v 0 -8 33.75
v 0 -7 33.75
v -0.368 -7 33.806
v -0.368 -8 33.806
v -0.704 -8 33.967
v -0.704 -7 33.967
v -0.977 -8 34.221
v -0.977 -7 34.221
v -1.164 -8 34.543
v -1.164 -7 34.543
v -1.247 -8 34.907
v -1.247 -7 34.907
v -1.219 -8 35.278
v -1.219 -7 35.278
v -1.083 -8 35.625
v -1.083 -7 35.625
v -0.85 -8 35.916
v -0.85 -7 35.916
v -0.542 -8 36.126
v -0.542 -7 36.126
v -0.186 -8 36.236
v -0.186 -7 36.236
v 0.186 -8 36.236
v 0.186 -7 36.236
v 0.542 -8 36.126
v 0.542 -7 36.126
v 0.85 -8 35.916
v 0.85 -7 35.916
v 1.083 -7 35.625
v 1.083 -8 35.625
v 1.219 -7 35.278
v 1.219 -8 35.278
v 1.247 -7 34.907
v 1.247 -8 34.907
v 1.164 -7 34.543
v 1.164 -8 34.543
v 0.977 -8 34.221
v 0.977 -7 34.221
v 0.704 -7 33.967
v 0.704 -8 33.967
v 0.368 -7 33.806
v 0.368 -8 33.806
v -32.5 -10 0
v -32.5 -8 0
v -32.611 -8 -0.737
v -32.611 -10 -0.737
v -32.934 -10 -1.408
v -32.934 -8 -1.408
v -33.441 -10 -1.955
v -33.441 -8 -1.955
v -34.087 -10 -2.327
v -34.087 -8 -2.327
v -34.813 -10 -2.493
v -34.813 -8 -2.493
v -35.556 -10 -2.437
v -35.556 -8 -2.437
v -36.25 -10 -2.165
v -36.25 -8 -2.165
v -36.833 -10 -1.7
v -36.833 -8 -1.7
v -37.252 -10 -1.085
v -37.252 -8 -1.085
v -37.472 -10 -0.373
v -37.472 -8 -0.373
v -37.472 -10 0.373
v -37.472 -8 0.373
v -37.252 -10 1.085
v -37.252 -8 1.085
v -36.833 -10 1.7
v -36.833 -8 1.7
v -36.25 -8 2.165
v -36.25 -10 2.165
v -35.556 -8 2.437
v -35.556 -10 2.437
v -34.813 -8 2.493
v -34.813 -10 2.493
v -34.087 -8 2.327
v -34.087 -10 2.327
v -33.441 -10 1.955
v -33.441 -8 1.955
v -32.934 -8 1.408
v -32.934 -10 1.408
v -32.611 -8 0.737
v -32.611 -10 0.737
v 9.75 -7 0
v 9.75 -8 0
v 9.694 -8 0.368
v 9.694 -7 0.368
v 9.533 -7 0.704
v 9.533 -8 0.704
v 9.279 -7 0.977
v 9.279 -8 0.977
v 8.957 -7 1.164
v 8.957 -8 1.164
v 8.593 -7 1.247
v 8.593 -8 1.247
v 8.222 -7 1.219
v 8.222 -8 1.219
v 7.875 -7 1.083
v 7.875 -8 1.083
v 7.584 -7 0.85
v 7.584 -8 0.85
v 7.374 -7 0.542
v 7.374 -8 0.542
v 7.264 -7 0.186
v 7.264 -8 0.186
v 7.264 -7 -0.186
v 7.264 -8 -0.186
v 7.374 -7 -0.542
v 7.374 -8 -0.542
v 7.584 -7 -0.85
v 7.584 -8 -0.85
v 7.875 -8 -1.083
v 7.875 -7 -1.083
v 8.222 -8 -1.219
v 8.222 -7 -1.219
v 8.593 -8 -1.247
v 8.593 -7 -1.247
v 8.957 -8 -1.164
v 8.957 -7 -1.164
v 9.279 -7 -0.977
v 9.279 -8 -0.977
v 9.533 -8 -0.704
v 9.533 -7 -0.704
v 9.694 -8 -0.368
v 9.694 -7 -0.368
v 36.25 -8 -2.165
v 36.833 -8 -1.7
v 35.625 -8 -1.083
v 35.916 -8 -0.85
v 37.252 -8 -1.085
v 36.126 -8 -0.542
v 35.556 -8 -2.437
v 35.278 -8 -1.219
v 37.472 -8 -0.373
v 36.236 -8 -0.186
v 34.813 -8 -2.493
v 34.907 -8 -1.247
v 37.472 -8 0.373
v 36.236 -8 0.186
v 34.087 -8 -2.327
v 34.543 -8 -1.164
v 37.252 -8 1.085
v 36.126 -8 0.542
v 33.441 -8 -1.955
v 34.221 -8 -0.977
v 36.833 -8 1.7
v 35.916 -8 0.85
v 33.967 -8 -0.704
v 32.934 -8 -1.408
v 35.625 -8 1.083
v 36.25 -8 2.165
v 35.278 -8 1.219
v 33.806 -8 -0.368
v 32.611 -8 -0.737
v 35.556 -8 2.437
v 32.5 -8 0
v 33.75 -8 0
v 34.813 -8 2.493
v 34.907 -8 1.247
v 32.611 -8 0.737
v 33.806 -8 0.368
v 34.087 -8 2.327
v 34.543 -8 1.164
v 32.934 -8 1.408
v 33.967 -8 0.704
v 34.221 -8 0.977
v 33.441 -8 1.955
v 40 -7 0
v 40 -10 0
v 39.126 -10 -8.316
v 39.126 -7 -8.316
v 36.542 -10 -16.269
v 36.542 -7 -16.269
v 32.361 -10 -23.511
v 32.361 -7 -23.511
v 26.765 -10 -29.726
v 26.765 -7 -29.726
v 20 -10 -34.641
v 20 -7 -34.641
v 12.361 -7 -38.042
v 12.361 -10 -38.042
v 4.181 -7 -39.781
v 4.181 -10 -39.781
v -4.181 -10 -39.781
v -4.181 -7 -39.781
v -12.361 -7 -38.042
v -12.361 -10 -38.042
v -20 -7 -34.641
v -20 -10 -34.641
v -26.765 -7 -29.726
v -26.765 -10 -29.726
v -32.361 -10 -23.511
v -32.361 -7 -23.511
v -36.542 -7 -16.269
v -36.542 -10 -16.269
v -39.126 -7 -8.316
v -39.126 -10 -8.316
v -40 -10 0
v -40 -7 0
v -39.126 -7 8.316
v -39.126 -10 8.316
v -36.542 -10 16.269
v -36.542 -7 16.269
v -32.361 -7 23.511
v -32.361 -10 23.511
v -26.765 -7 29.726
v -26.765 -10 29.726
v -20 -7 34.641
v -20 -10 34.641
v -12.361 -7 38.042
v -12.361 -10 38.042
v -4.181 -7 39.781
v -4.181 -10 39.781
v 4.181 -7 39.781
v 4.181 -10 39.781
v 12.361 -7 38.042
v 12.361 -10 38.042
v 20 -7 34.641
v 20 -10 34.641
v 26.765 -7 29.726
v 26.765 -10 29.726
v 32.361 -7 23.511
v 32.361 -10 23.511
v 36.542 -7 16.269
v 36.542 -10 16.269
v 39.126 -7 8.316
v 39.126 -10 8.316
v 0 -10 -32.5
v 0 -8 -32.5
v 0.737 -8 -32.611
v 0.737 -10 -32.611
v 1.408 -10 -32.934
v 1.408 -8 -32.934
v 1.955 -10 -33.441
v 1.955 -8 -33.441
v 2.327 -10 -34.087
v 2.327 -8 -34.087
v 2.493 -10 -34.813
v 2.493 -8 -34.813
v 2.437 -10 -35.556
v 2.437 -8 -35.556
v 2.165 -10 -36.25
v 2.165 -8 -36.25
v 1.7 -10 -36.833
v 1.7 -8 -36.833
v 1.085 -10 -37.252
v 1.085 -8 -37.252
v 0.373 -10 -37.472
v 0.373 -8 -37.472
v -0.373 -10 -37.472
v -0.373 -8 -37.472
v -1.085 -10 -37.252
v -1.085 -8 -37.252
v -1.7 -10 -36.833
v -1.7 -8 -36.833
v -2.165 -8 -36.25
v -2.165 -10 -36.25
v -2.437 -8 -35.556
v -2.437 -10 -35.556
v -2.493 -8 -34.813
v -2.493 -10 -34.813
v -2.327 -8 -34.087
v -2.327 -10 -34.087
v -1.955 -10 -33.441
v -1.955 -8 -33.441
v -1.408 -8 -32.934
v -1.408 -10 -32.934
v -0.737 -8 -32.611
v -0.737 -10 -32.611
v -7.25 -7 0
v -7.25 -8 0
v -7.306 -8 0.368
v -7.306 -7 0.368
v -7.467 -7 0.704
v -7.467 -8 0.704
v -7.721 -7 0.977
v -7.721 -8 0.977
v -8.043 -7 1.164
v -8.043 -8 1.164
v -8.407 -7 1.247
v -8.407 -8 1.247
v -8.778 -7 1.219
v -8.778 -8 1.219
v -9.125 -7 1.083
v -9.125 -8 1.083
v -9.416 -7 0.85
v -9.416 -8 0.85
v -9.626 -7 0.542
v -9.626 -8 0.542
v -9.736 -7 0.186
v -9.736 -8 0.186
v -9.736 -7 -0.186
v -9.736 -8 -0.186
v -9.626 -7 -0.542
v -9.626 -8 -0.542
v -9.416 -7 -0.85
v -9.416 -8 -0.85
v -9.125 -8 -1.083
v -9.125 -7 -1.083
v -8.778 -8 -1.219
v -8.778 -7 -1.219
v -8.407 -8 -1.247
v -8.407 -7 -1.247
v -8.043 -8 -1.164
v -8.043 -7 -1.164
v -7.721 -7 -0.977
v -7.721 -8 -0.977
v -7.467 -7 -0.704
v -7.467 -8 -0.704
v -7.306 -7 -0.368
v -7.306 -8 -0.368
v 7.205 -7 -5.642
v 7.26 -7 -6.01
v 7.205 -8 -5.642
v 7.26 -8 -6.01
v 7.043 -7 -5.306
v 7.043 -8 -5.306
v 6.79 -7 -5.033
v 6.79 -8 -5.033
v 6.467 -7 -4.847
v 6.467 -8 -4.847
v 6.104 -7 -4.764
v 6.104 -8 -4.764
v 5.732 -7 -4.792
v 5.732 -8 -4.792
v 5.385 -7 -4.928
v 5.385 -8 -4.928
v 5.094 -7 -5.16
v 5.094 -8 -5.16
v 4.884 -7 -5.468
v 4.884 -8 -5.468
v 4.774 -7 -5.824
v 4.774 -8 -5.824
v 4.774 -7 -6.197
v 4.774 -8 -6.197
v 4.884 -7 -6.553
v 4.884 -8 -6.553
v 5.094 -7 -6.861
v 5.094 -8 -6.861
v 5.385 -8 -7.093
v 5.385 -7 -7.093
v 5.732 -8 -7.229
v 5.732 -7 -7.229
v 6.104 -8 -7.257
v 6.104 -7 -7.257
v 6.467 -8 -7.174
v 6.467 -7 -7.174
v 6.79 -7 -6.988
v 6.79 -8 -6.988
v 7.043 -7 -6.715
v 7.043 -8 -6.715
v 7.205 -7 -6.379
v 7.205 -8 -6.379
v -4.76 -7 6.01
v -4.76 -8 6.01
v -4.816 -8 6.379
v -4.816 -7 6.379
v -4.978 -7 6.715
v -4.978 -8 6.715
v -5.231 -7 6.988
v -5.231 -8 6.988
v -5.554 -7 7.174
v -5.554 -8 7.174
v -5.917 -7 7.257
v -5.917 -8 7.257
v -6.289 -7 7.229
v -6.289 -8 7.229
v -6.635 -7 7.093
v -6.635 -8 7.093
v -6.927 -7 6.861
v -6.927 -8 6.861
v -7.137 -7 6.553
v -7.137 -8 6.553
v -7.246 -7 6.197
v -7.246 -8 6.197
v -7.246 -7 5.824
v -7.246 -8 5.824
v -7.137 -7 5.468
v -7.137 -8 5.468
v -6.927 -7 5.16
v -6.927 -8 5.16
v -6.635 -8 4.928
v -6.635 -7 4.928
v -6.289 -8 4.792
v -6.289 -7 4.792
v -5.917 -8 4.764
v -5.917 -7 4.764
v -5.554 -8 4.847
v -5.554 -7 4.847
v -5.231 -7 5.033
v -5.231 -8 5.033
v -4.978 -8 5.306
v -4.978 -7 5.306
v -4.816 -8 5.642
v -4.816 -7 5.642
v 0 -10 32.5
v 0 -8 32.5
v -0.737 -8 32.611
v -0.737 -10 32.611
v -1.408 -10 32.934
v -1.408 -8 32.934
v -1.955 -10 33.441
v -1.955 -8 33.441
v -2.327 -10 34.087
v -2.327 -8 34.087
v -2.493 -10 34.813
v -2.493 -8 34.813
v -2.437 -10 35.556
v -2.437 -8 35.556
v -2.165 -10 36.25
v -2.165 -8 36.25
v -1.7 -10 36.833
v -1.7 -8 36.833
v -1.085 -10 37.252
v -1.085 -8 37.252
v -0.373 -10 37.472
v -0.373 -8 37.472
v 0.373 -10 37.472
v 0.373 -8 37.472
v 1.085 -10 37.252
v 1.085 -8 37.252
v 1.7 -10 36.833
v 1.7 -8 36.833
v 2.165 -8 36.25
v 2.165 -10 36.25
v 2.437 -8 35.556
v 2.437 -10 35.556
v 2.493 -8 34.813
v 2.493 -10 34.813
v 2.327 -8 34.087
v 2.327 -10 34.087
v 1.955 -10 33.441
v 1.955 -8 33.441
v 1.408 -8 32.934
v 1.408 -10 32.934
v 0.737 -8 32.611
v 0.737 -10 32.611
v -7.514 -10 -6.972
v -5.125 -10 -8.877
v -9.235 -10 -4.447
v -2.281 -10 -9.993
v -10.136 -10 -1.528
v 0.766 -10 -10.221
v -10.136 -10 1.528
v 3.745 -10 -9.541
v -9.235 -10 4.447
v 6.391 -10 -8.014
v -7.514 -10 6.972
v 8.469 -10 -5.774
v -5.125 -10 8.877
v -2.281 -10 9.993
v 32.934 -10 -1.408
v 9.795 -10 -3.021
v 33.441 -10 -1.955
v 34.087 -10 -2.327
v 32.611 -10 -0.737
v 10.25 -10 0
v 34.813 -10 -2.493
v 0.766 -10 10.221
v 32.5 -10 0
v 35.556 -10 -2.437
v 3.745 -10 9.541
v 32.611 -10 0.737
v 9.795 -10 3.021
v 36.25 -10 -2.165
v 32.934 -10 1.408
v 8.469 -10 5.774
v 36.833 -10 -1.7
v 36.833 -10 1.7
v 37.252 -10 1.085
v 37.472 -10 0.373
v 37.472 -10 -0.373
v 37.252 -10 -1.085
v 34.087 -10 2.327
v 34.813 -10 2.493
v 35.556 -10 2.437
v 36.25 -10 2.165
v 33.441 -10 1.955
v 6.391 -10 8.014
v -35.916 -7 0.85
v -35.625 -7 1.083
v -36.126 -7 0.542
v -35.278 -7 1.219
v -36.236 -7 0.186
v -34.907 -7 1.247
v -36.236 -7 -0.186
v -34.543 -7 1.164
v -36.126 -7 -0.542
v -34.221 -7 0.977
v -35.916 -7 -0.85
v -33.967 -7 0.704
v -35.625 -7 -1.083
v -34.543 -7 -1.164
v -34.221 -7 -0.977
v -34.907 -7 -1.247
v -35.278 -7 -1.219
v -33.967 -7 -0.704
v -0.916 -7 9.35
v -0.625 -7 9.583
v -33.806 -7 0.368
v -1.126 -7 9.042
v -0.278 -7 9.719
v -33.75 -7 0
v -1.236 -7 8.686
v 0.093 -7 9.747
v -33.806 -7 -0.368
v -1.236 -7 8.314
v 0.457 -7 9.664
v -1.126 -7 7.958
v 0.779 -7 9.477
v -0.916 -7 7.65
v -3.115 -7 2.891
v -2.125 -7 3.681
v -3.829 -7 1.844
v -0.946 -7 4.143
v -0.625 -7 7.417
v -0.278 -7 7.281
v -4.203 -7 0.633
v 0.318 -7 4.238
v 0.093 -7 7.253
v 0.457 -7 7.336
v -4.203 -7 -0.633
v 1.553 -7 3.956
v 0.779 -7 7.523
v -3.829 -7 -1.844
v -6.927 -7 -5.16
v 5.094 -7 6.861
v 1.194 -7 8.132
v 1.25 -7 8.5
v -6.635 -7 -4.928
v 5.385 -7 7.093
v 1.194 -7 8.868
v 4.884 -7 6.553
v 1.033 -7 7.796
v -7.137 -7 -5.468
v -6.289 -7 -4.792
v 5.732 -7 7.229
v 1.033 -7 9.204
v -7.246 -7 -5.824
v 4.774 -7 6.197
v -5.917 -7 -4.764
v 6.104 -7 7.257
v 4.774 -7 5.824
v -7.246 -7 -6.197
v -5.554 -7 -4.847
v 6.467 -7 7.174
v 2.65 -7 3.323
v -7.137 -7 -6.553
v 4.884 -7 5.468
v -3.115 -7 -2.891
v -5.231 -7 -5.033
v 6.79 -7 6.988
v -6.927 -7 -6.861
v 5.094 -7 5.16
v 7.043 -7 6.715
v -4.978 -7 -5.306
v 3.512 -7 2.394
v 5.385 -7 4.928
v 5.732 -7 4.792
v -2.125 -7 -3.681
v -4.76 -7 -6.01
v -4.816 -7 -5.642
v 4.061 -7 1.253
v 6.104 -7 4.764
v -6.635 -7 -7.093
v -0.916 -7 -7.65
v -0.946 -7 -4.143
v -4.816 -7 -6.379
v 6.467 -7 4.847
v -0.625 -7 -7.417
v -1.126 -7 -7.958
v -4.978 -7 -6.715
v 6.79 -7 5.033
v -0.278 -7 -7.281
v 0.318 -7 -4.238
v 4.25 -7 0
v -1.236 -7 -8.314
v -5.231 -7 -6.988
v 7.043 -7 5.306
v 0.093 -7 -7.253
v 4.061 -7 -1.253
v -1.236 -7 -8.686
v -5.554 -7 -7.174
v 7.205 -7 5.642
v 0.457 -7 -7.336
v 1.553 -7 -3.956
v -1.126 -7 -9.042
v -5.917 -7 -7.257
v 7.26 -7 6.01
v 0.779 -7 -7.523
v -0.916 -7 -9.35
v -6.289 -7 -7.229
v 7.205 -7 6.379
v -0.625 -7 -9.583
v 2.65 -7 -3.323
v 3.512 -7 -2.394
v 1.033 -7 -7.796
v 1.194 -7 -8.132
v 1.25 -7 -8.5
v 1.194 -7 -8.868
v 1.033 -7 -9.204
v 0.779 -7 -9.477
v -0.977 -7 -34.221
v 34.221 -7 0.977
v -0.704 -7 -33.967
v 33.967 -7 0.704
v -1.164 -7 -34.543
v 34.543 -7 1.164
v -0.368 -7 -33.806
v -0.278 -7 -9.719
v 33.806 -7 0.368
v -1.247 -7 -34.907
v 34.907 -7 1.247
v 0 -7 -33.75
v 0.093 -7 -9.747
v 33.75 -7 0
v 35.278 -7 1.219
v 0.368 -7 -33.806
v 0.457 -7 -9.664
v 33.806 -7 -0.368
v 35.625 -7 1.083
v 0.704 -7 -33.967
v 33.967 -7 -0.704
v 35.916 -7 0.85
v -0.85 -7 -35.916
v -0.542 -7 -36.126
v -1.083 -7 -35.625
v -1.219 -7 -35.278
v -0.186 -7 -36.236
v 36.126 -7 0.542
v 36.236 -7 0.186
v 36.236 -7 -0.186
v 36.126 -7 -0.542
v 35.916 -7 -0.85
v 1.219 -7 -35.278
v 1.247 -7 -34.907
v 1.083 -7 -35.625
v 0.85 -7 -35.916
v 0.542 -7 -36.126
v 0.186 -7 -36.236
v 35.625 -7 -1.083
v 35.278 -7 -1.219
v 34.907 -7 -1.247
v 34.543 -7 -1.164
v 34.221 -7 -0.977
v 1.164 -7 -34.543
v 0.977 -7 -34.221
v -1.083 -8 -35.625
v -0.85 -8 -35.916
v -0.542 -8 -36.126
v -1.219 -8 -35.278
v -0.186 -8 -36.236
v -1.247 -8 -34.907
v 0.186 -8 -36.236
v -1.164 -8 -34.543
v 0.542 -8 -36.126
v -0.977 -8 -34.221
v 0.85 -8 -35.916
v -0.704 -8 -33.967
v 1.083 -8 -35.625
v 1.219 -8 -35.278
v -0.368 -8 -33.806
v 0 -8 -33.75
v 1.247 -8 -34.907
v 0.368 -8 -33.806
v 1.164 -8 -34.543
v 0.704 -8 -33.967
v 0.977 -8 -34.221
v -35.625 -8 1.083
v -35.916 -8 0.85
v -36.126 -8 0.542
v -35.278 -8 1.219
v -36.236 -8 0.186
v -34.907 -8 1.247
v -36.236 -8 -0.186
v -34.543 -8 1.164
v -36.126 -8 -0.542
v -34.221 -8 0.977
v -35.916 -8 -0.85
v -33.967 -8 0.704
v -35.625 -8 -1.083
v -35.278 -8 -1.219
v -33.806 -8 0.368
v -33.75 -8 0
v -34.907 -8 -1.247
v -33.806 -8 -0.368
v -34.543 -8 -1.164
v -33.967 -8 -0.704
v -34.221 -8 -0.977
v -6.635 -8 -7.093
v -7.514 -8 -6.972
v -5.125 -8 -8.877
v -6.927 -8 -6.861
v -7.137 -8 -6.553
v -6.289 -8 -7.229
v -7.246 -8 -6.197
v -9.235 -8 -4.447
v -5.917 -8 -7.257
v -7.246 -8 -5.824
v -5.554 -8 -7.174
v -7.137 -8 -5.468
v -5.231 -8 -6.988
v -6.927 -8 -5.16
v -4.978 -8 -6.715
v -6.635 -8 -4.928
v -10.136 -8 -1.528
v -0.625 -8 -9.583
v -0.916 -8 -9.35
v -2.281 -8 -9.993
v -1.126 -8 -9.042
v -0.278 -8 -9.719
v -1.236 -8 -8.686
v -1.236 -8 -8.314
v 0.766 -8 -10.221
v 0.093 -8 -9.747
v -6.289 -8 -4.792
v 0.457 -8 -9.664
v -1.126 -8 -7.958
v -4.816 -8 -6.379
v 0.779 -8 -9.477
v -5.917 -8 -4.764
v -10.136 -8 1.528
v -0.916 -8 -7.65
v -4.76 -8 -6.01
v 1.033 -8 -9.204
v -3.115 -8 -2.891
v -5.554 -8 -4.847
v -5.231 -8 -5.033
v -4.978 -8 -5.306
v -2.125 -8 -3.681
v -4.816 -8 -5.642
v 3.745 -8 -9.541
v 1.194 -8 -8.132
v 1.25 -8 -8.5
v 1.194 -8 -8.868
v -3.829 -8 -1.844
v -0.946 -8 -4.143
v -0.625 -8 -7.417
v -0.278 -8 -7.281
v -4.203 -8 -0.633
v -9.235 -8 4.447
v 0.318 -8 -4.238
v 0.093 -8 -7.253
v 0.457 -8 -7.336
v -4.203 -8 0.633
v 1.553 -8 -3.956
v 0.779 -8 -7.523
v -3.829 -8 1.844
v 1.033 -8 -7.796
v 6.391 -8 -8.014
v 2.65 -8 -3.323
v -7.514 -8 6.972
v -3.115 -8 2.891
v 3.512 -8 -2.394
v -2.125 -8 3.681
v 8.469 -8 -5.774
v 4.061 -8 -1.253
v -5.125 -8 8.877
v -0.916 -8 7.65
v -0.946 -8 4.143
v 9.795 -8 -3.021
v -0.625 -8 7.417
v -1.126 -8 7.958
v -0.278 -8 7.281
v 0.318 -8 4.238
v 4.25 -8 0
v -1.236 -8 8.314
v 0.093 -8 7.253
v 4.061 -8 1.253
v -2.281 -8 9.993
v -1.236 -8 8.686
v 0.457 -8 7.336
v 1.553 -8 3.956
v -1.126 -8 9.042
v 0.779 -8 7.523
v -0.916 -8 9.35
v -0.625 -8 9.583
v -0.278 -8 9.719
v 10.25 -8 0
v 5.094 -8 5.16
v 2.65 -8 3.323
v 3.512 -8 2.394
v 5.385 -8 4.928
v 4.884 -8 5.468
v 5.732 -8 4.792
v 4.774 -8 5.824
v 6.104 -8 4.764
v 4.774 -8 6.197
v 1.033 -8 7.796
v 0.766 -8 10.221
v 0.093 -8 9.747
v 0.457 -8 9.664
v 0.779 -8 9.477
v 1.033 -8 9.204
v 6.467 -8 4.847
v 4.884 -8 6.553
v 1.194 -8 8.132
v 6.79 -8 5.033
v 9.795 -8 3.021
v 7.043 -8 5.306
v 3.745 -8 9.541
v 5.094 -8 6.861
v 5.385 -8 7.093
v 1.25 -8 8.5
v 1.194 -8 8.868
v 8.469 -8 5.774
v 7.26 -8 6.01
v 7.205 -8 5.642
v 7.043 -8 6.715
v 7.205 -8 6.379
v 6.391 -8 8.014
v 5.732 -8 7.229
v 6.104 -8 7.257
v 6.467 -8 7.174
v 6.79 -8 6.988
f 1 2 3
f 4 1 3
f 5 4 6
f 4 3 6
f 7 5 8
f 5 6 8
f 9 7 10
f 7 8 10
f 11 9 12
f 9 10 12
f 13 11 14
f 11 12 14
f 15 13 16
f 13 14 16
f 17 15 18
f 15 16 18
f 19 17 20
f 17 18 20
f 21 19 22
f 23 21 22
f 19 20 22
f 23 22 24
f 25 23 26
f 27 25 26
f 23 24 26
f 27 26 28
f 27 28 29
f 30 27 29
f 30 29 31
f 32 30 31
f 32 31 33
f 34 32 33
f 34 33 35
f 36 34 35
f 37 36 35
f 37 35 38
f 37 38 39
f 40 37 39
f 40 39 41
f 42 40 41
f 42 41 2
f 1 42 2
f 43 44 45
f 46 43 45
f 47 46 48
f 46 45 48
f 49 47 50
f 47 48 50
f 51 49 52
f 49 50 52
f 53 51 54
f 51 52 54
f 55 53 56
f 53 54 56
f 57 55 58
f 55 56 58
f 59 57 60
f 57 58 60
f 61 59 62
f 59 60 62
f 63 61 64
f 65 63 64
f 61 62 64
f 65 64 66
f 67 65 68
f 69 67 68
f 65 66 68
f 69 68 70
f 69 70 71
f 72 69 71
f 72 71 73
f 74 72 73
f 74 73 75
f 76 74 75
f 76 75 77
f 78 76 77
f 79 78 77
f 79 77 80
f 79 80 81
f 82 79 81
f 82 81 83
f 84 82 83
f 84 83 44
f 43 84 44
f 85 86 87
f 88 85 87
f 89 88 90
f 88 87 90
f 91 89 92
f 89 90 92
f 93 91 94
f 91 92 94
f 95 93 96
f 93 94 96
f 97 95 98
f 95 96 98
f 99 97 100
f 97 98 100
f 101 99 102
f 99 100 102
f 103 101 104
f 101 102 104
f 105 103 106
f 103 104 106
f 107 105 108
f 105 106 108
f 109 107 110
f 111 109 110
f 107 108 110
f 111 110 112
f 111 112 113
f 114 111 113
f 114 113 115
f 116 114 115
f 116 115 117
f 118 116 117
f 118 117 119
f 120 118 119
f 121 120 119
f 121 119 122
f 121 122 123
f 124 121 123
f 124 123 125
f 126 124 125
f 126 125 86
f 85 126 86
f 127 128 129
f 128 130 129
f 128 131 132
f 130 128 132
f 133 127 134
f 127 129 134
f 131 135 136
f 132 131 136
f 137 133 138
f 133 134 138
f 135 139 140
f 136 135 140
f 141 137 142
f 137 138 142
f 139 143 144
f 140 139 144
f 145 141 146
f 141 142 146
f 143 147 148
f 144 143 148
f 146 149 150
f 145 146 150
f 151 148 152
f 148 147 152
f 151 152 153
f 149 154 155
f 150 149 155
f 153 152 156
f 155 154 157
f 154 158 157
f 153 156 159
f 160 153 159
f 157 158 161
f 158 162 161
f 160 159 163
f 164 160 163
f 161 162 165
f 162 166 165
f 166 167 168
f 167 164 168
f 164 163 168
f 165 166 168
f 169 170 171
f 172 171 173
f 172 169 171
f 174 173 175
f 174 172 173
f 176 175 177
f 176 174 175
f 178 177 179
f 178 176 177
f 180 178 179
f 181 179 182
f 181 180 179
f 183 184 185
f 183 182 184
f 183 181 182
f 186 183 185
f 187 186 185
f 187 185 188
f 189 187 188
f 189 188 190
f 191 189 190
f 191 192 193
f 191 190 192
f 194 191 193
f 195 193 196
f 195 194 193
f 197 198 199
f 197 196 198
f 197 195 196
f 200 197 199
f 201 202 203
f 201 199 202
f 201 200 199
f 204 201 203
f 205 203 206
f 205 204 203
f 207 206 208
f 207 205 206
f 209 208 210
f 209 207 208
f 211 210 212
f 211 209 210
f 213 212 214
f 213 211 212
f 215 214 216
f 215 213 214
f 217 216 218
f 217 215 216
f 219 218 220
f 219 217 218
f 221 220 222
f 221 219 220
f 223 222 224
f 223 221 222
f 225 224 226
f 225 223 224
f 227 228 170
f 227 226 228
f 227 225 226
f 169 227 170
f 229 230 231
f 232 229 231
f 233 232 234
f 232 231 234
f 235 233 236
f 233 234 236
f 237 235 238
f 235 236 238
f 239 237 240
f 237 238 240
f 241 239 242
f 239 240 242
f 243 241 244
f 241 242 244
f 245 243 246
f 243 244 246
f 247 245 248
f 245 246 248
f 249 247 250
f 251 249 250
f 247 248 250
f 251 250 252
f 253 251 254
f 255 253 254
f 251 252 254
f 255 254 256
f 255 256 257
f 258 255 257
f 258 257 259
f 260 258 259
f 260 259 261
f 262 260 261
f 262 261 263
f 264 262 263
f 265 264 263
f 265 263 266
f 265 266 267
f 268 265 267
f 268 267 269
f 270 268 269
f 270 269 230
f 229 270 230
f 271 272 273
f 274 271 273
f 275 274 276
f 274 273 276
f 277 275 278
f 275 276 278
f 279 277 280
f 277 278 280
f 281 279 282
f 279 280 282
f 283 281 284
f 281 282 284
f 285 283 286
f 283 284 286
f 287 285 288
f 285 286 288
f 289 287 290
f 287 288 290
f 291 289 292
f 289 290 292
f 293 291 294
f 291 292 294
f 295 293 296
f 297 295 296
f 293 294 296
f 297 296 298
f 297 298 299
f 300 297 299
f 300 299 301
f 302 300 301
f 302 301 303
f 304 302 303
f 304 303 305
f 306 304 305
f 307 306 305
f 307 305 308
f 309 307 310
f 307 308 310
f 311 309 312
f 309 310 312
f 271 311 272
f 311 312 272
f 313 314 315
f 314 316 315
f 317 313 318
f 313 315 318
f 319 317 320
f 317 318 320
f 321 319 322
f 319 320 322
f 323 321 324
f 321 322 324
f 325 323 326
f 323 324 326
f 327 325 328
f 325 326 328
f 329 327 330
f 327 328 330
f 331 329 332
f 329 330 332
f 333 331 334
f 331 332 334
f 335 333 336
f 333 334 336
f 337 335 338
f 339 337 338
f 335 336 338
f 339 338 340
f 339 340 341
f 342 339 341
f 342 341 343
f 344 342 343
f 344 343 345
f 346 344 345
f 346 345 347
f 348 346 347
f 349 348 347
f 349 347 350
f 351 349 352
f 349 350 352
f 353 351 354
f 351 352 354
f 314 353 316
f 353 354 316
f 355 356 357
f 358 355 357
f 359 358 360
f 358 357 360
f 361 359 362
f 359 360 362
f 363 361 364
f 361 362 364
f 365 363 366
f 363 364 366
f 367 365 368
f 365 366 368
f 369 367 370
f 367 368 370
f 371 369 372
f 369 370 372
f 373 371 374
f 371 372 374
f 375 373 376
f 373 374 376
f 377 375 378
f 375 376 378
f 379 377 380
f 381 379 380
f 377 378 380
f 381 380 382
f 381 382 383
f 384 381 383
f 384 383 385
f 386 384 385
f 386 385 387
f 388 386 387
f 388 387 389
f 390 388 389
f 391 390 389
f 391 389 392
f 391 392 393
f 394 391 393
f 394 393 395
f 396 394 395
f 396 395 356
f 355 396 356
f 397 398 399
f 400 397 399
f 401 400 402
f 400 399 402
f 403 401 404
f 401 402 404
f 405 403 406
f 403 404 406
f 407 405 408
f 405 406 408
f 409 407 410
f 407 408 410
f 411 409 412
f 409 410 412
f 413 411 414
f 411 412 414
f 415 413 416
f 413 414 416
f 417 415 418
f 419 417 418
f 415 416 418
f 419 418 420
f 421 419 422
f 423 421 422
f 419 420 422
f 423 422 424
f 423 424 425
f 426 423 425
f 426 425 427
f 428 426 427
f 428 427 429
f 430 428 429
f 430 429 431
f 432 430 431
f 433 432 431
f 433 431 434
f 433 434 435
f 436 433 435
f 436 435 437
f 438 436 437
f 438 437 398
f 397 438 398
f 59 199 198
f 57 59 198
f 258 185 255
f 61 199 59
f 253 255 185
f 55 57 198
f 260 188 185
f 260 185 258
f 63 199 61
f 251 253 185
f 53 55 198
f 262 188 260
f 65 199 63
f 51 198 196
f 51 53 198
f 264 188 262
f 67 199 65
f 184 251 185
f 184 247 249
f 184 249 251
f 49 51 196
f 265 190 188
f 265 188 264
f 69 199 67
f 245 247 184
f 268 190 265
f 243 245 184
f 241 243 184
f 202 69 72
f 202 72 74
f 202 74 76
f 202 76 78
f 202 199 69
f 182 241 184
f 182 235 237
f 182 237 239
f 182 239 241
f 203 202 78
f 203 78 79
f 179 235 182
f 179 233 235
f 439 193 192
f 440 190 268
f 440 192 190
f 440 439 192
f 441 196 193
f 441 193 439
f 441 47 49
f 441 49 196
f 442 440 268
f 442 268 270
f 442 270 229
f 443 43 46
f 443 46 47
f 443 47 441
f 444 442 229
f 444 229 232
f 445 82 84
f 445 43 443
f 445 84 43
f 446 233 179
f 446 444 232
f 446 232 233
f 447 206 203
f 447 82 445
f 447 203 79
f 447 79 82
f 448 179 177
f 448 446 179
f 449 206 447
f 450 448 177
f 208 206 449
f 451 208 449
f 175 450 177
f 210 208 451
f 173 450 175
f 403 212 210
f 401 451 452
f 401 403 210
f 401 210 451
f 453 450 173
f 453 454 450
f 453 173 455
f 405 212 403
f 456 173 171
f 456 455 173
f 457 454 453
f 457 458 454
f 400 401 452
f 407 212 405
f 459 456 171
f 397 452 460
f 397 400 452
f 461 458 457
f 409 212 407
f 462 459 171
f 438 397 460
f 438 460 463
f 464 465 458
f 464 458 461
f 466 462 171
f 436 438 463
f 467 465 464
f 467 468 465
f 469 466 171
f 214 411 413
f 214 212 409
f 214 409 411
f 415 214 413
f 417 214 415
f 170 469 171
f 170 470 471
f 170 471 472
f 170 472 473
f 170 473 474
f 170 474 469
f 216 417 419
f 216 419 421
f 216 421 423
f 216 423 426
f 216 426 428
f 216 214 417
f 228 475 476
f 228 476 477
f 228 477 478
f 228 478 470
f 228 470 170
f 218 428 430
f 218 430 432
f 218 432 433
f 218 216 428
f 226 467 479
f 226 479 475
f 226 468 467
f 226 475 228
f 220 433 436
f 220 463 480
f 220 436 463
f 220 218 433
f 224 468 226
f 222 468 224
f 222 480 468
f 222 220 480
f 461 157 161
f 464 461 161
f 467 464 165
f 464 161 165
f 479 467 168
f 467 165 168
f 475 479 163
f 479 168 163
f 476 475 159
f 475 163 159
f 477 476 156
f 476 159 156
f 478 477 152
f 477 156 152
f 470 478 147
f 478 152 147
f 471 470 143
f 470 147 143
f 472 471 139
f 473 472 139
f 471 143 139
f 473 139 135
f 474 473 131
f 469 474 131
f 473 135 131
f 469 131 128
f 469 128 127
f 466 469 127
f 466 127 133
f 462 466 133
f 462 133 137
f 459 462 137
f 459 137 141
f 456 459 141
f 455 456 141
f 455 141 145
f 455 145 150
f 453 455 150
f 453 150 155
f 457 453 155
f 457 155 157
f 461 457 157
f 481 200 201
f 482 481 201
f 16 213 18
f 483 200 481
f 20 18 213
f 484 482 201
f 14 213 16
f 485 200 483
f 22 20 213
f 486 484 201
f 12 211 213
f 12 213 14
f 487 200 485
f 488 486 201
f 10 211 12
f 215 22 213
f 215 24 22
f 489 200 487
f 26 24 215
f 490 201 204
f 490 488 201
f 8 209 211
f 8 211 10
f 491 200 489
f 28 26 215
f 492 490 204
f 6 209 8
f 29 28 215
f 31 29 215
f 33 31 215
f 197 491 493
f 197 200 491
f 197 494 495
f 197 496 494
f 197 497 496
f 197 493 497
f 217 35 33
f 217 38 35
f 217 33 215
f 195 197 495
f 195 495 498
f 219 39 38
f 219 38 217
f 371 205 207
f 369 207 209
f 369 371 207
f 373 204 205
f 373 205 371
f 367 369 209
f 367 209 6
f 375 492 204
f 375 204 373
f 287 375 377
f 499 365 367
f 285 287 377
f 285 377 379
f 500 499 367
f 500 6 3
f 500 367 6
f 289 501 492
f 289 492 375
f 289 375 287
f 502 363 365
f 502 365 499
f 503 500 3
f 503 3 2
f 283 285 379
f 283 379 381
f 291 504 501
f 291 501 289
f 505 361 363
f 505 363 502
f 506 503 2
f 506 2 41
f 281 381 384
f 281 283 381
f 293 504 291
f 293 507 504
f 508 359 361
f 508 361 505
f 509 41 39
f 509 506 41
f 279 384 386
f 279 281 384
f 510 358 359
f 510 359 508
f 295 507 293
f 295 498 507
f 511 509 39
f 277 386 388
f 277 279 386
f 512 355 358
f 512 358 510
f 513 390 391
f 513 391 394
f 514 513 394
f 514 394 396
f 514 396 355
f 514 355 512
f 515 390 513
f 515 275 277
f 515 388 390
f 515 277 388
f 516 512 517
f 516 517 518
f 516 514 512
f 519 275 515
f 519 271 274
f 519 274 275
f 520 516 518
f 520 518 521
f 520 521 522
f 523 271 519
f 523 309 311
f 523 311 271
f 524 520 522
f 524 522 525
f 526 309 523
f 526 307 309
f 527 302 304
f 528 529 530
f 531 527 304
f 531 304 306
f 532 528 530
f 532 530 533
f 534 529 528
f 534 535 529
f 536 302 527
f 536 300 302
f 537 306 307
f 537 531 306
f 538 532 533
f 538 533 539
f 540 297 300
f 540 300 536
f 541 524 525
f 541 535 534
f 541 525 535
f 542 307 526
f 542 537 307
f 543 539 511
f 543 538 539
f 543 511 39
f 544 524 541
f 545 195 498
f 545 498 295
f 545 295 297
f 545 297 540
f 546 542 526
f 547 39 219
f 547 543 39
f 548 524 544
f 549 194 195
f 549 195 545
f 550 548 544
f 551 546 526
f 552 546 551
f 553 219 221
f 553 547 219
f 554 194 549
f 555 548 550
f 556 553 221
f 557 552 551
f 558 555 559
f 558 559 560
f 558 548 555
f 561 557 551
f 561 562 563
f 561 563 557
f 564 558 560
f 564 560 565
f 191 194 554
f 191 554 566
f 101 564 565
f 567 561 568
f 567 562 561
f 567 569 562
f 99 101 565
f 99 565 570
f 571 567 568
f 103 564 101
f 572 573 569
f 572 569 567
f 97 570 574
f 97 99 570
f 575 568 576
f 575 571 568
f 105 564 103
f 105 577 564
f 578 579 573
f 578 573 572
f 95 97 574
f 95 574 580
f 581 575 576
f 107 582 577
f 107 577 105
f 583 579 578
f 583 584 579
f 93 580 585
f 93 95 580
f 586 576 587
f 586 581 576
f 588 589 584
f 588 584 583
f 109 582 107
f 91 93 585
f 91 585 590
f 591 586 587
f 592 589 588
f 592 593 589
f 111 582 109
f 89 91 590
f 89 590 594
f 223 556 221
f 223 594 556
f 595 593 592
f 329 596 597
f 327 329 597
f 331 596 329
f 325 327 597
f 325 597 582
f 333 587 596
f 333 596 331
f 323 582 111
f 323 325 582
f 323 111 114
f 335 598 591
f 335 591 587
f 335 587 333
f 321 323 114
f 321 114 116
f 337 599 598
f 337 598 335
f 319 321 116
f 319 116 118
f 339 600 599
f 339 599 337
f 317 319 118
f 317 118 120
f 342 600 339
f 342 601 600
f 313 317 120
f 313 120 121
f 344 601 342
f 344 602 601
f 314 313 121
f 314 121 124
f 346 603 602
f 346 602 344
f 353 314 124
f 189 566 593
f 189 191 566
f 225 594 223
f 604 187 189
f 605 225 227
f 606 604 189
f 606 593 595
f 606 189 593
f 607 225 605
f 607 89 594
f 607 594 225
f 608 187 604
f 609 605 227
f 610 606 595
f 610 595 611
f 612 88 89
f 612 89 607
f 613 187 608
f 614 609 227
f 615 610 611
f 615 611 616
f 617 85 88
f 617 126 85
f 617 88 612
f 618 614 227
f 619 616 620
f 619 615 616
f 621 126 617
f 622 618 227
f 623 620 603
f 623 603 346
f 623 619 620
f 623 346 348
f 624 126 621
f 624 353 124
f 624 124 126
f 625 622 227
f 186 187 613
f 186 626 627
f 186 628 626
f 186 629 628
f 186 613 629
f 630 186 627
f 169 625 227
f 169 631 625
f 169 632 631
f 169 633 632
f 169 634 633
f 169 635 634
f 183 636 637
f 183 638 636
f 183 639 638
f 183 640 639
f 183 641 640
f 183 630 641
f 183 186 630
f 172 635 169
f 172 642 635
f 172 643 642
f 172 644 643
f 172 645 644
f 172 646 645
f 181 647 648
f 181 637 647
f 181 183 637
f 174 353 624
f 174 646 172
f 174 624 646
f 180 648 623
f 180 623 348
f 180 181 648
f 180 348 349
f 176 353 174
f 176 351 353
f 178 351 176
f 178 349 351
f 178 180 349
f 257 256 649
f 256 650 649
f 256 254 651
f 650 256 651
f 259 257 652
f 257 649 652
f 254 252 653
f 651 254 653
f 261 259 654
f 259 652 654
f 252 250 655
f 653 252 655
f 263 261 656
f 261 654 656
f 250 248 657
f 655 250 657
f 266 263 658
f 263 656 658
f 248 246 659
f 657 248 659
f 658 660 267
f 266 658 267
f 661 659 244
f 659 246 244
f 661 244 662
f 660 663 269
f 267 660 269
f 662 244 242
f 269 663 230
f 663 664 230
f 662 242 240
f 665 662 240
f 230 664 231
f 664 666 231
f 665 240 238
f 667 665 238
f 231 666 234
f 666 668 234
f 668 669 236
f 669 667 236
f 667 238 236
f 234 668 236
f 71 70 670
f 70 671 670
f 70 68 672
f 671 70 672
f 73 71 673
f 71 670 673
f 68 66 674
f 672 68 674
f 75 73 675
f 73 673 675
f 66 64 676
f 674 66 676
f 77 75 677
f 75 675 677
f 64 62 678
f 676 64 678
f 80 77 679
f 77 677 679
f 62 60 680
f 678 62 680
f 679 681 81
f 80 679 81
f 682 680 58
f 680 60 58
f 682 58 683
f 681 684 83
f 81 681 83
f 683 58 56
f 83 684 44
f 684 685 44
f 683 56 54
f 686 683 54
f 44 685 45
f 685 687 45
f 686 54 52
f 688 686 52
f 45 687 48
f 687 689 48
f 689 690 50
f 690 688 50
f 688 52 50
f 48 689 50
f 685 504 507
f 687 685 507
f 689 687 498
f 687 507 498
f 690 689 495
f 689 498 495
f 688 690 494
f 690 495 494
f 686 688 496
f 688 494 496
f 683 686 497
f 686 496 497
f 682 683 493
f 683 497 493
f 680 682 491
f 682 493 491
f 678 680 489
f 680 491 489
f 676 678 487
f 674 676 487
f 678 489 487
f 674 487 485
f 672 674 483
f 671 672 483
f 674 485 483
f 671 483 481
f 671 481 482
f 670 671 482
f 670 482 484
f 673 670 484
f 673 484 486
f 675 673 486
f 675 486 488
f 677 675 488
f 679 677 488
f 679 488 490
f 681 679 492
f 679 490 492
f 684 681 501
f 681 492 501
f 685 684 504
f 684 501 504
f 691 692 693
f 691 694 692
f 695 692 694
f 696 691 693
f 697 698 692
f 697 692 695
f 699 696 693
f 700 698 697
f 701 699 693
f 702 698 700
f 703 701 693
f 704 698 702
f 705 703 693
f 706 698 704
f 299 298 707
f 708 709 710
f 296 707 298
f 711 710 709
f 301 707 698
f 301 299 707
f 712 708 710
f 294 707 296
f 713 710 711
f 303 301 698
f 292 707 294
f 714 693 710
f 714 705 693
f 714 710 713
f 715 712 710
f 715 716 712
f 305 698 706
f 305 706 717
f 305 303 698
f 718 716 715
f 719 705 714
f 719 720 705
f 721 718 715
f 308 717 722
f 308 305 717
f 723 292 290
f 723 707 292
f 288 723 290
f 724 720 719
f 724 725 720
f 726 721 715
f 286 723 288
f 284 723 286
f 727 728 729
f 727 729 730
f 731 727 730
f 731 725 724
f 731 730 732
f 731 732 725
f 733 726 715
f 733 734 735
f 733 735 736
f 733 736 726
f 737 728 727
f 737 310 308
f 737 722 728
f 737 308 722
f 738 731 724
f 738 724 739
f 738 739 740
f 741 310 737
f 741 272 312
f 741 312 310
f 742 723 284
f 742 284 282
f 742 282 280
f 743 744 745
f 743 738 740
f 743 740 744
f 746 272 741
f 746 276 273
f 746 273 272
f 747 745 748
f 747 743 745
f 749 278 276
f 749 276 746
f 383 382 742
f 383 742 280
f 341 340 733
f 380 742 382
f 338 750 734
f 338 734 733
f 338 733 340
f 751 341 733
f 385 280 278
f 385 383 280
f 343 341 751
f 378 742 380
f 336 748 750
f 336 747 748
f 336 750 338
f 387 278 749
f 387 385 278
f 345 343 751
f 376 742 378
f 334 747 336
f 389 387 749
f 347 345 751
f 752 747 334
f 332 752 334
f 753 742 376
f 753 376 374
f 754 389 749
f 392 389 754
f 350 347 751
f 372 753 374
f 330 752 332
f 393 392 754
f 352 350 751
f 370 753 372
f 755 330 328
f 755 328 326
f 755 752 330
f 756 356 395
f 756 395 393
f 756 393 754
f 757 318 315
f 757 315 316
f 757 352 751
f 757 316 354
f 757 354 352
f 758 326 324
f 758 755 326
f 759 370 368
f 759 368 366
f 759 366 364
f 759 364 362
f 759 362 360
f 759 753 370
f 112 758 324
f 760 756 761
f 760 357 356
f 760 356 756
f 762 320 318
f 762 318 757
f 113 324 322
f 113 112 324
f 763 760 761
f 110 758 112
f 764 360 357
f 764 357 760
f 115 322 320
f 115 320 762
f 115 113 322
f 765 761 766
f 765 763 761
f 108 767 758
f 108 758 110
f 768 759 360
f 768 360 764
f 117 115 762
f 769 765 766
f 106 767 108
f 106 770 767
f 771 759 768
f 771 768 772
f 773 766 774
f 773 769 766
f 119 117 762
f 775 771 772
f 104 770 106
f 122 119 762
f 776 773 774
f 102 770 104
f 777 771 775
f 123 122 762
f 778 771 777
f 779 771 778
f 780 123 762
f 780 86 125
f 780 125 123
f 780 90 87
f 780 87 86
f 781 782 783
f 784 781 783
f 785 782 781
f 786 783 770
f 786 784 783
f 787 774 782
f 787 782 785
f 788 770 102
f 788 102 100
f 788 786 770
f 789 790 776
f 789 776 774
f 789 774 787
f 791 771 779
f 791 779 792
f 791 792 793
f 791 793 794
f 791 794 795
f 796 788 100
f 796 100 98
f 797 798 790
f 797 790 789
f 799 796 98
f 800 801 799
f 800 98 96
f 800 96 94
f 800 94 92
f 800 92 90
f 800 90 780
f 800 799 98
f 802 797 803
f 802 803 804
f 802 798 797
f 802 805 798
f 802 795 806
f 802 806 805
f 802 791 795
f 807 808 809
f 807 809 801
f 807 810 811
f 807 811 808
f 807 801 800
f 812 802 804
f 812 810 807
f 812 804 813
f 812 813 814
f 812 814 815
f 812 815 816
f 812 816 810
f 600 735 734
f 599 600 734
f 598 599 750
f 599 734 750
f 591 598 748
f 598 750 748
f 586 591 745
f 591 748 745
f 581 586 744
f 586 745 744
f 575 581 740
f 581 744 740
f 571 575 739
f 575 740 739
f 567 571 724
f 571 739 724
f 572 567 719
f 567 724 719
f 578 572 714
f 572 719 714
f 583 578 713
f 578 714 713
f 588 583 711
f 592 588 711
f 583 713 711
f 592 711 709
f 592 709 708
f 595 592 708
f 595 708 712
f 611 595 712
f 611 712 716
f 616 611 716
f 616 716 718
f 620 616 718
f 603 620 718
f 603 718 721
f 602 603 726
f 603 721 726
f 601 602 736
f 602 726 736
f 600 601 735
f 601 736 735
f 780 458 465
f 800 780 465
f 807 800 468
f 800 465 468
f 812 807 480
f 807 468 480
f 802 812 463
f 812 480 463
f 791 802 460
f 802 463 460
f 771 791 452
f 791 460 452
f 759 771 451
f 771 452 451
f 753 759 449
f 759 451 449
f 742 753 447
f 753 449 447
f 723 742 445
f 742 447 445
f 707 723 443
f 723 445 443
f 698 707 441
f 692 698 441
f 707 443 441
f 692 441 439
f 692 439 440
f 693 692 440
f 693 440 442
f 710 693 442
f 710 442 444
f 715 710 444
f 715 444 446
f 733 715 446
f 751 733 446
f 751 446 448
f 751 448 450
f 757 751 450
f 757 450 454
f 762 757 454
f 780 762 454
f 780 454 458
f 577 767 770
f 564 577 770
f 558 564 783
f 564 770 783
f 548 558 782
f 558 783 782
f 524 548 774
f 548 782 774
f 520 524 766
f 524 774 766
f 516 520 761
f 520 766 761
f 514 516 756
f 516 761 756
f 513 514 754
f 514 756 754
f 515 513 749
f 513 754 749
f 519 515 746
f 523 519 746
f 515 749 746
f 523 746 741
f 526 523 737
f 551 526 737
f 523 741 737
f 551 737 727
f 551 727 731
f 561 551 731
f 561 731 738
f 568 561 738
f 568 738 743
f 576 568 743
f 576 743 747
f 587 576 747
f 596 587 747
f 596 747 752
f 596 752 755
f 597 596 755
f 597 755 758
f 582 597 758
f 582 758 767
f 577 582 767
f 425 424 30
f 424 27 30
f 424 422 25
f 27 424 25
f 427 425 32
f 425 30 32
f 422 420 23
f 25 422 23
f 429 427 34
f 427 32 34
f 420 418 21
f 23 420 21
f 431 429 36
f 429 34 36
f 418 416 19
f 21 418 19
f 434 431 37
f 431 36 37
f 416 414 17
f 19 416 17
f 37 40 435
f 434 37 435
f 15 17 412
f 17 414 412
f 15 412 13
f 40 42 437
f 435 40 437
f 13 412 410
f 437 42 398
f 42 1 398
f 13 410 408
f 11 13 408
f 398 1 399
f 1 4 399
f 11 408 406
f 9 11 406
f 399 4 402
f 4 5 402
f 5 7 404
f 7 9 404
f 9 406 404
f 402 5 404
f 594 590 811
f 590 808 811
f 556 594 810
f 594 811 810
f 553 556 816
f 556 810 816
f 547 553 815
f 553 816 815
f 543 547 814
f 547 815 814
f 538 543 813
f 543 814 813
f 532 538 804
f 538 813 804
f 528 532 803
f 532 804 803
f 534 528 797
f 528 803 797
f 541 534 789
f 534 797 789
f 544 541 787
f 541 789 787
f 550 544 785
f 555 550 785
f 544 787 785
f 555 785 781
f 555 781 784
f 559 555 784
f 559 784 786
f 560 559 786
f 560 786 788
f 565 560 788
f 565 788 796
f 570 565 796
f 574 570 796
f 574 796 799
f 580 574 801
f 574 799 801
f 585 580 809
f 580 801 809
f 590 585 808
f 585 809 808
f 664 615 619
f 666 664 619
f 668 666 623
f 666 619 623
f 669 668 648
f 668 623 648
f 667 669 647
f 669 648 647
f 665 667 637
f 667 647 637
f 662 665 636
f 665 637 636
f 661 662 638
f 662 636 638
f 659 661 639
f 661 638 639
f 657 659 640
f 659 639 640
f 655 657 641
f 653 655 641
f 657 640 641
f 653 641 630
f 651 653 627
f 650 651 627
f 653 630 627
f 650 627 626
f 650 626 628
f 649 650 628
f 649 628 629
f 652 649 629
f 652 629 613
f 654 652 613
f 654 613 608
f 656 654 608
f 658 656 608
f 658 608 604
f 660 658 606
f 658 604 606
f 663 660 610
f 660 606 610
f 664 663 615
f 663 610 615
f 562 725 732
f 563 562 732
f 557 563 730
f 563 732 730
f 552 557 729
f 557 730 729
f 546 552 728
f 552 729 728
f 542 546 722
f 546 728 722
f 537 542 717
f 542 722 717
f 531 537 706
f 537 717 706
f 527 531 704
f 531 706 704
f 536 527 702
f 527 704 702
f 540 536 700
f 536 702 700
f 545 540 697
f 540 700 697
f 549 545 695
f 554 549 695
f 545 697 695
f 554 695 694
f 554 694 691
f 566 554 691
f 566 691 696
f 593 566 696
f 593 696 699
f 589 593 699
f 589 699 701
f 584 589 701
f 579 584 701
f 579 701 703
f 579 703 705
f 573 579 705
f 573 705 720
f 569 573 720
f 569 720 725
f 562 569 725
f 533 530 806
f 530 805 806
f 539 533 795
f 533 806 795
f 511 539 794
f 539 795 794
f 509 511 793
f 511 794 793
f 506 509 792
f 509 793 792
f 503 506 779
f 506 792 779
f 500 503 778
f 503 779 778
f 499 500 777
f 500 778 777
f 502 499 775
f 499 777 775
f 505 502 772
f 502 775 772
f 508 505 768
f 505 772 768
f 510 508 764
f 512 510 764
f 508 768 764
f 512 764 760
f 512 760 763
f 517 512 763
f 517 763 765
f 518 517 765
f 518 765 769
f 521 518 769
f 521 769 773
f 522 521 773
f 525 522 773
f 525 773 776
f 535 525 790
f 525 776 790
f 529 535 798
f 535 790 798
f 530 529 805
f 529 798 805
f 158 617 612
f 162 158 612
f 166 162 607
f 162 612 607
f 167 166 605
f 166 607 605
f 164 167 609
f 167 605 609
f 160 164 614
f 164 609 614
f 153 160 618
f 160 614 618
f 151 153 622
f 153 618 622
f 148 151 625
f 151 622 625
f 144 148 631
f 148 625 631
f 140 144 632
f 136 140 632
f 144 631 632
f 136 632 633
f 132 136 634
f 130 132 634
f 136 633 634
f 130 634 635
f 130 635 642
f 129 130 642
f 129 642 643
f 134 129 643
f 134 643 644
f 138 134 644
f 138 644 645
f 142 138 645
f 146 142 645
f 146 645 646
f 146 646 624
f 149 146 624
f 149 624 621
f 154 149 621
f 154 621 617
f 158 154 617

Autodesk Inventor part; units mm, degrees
ref_plane "YZ Plane" through (0, 0, 0) normal (1, 0, 0) x (0, 1, 0)
ref_plane "XZ Plane" through (0, 0, 0) normal (0, 1, 0) x (-1, 0, 0)
ref_plane "XY Plane" through (0, 0, 0) normal (0, 0, 1) x (1, 0, 0)
sketch "Sketch1" plane through (0, 0, 0) normal (0, 1, 0) x (-1, 0, 0)
  circle A0 centre (0, 0) radius 30
  circle A1 centre (0, 0) radius 45
  circle A2 centre (0, 0) radius 20
  dimension "d0" = 60
  dimension "d1" = 90
  dimension "d2" = 40
extrude "Extrusion1" add sketch "Sketch1" along normal blind 20 draft -4 contours A0
sketch "Sketch2" plane through (0, 20, 0) normal (0, 1, 0) x (1, 0, 0)
  circle A0 centre (0, 0) radius 28.6015
  circle A1 centre (0, 0) radius 21.3985
extrude "Extrusion2" add sketch "Sketch2" along normal blind 20 draft 4
sketch "Sketch3" plane through (0, 40, 0) normal (0, 1, 0) x (1, 0, 0)
  circle A0 centre (0, 0) radius 40
  dimension "d7" = 80
extrude "Extrusion3" add sketch "Sketch3" along normal blind 10
sketch "Sketch4" plane through (0, 0, 0) normal (0, -1, 0) x (1, 0, 0)
  circle A0 centre (0, 0) radius 40
  dimension "d10" = 80
extrude "Extrusion4" add sketch "Sketch4" along normal blind 10
sketch "Sketch5" plane through (0, -10, 0) normal (0, -1, 0) x (1, 0, 0)
  circle A0 centre (0, 0) radius 2.25
  circle A1 centre (0, 0) radius 4.25
  circle A2 centre (0, 0) radius 10.25
  dimension "d13" = 4.5
  dimension "d16" = 8.5
  dimension "d17" = 20.5
extrude "Extrusion9" cut sketch "Sketch5" against normal blind 2 contours A2
extrude "Extrusion10" cut sketch "Sketch5" against normal blind 4 contours A0 | A1
sketch "Sketch6" plane through (0, -8, 0) normal (0, -1, 0) x (1, 0, 0)
  circle A0 centre (0, 8.5) radius 1.25
  circle A1 centre (0, 0) radius 8.5
  circle A2 centre (-6.0104, 6.0104) radius 1.25
  circle A3 centre (-8.5, 0) radius 1.25
  circle A4 centre (-6.0104, -6.0104) radius 1.25
  circle A5 centre (0, -8.5) radius 1.25
  circle A6 centre (6.0104, -6.0104) radius 1.25
  circle A7 centre (8.5, 0) radius 1.25
  circle A8 centre (6.0104, 6.0104) radius 1.25
  circle A9 centre (0, 0) radius 10.25 projected
  line L0 (0, 8.5) -> (0, 7.25) construction
  line L1 (0, -8.5) -> (0, -7.25) construction
  line L2 (0, 7.25) -> (0, 0) construction
  point P0 (5.0639, 6.8269)
  point P1 (6.8269, 5.0639)
  dimension "d34" = 2.5
  dimension "d30" = 360
  dimension "d36" = 14.5
  dimension "d37" = 1.25
extrude "Extrusion11" cut sketch "Sketch6" against normal through all contours A0 A1 | A1 A0 | A2 A1 | A1 A2 | A8 A1 | A1 A8 | A3 A1 | A1 A3 | A7 A1 | A1 A7 | A4 A1 | A1 A4 | A6 A1 | A1 A6 | A5 A1 | A1 A5
sketch "Sketch7" plane through (0, -10, 0) normal (0, -1, 0) x (1, 0, 0)
  point P0 (0, 0)
sketch "Sketch8" plane through (0, 50, 0) normal (0, 1, 0) x (1, 0, 0)
  circle A0 centre (0, 0) radius 69.6174
extrude "Extrusion12" cut sketch "Sketch8" against normal blind 57
sketch "Sketch12" plane through (0, -10, 0) normal (0, -1, 0) x (1, 0, 0)
  circle A0 centre (0, 0) radius 4.25 projected
  circle A1 centre (0, 0) radius 35 construction
  point P0 (0, 35)
  dimension "d57" = 70
hole "Hole2" at (0, -10, 35) direction (0, 1, 0) diameter 2.5 depth 8 tip angle 118 counterbore diameter 5 counterbore depth 2
pattern_circular "Circular Pattern2" count 4 over 360 about axis through (0, 0, 0) along (0, -1, 0) of "Hole2"
sketch "Sketch9" plane through (0, -10, 0) normal (0, -1, 0) x (1, 0, 0)
  circle A0 centre (0, 0) radius 16.7725
  circle A1 centre (0, 0) radius 4.25 projected
  circle A2 centre (0, 0) radius 45.7596
properties part number "spool_test" material "ABS Plastic"
